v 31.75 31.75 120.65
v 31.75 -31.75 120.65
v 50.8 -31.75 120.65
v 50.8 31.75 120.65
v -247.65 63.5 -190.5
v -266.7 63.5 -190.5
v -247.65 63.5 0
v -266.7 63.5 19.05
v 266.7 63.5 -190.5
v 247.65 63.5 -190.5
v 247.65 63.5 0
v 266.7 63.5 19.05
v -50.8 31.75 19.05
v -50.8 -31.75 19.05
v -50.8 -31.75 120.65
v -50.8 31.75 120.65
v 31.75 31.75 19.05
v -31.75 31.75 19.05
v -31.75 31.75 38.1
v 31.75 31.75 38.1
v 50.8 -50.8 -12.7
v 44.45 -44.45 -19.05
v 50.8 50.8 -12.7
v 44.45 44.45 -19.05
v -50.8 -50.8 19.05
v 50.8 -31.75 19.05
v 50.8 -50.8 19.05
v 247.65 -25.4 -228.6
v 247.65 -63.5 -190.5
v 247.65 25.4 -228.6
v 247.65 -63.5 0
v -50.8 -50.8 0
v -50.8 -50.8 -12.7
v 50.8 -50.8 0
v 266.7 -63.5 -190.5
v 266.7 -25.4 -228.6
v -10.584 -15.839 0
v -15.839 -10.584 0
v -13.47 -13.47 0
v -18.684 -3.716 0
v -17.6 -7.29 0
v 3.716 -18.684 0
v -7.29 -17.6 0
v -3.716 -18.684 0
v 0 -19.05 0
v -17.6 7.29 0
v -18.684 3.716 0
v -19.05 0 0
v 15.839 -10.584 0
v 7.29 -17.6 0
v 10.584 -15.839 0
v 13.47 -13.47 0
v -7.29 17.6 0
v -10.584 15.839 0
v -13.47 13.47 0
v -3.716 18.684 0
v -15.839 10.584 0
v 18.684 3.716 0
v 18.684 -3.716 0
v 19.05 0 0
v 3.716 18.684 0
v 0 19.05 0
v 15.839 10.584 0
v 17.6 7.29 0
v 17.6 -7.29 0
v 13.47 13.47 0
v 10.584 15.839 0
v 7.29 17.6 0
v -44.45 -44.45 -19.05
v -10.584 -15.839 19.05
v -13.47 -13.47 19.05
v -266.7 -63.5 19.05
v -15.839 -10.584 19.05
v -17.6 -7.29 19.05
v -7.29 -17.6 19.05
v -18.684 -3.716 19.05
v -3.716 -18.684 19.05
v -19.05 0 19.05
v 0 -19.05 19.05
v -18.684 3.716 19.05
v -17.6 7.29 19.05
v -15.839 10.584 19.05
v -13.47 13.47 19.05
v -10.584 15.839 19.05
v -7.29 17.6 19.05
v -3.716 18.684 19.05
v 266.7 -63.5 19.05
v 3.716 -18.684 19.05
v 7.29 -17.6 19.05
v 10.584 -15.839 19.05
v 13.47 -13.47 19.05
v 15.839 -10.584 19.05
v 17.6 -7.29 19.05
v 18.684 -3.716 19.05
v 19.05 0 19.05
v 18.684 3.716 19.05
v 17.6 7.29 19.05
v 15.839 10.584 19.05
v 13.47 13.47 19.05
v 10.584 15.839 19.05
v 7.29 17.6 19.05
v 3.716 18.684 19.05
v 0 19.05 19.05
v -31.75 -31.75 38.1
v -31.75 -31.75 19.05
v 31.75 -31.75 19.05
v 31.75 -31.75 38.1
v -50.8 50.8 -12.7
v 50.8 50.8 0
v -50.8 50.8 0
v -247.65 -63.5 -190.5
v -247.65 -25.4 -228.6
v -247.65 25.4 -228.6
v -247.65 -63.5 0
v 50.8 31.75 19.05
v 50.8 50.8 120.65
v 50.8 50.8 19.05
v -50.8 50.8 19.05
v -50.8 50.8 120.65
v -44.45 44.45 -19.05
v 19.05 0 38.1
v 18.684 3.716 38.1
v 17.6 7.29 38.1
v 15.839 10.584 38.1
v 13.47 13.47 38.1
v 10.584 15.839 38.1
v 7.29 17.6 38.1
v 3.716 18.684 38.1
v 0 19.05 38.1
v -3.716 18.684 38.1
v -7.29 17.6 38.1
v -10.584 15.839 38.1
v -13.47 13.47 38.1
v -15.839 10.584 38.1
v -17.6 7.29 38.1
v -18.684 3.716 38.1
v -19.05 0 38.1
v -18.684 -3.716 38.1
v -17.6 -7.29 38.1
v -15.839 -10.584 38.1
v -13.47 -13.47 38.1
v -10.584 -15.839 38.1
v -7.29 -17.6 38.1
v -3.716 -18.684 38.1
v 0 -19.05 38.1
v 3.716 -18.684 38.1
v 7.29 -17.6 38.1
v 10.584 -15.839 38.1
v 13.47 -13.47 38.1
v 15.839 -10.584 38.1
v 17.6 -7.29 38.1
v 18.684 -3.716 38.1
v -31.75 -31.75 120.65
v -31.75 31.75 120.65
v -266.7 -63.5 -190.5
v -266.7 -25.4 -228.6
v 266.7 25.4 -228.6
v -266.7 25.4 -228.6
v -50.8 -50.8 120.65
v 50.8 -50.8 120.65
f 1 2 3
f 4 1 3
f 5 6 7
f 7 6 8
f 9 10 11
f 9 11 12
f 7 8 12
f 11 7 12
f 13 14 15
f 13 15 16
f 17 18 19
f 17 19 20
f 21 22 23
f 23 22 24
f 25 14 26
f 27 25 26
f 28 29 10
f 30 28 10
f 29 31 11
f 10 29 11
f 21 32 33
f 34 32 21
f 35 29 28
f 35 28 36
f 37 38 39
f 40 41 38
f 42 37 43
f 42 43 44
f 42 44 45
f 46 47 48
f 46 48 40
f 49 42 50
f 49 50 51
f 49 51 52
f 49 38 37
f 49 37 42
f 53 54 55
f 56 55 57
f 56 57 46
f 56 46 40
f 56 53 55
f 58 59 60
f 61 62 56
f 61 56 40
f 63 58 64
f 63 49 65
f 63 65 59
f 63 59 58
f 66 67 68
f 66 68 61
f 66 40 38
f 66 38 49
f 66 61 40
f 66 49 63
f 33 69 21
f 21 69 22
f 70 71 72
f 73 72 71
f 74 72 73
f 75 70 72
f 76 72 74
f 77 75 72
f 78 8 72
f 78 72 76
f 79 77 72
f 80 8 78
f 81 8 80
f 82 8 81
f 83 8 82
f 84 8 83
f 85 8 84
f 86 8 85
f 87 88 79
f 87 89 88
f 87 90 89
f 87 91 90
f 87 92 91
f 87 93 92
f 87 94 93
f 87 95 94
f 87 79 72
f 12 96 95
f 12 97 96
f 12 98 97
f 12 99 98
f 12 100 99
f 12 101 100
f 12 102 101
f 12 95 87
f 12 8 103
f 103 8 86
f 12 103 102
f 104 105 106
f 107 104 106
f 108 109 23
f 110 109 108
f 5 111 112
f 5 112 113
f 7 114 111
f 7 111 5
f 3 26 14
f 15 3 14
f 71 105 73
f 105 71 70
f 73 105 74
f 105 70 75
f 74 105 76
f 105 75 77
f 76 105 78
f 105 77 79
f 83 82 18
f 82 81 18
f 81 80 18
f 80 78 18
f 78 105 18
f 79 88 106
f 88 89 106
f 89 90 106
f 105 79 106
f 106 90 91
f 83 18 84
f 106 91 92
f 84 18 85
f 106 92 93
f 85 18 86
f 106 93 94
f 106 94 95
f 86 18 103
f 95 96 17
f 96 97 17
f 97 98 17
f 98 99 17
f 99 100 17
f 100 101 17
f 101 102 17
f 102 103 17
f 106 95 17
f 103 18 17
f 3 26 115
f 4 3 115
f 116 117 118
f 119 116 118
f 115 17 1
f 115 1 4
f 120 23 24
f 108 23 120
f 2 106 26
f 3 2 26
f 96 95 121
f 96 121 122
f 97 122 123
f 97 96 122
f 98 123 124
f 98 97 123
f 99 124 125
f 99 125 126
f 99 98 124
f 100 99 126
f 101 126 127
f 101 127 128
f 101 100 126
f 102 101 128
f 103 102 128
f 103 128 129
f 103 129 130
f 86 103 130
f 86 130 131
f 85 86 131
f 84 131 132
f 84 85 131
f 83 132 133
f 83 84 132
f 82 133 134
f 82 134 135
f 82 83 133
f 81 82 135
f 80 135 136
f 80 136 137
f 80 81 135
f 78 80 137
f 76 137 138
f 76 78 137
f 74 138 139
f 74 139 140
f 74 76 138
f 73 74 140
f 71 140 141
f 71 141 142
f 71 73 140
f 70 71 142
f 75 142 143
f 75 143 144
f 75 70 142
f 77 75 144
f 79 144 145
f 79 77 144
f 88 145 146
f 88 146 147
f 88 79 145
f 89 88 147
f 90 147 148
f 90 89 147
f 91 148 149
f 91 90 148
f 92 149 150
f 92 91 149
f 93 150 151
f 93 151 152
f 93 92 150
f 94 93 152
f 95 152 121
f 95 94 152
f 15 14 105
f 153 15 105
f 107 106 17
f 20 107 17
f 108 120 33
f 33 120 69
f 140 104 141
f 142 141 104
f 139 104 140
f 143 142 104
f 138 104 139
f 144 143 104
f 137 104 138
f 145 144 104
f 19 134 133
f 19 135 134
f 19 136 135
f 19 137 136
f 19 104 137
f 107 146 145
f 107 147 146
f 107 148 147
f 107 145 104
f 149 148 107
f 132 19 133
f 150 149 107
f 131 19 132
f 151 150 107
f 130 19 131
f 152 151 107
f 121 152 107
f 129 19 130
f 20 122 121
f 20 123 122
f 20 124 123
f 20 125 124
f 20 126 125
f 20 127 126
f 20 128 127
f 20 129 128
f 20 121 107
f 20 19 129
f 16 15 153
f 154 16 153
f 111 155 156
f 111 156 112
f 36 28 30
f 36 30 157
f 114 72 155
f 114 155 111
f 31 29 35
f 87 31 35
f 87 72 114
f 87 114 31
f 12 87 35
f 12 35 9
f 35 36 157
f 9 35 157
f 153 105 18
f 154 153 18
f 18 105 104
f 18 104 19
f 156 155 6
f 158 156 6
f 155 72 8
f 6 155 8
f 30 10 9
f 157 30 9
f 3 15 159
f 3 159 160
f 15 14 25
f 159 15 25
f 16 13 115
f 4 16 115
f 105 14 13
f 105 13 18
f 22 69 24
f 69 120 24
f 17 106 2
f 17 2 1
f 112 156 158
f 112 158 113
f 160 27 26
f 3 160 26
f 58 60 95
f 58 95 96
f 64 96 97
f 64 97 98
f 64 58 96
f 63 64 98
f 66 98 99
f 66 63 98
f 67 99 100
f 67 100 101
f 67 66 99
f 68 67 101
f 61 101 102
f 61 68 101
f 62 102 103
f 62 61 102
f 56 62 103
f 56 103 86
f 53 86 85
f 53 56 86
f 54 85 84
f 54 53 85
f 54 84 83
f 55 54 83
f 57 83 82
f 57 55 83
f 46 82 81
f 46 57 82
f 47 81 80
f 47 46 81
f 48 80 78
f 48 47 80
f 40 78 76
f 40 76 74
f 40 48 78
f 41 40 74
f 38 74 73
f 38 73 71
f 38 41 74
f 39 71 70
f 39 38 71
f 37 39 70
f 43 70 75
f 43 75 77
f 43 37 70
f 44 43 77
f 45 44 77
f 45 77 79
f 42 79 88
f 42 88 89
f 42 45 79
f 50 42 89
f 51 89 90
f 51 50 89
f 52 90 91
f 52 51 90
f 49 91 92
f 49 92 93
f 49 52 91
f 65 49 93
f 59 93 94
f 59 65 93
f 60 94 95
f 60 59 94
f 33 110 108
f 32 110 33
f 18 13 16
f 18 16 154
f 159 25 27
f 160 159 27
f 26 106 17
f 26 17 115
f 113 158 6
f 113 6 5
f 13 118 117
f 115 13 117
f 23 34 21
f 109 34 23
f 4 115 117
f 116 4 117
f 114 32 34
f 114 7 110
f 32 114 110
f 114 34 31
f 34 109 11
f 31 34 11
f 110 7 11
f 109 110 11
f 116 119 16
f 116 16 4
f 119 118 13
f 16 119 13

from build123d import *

# Parameters (mm, degrees)
F0_W      = 495.3
F0_H      = 127
F0_W_2    = 19.05
F1_DEPTH  = 19.05
F2_DEPTH  = 228.6
F3_SIZE   = 38.1
F4_W      = 63.5
F4_H      = 63.5
F4_R      = 19.05
F5_DEPTH  = 19.05
F6_DEPTH  = 101.6
F4_W_2    = 19.05
F7_DEPTH  = 101.6
F8_R      = 19.05
F9_DEPTH  = 19.05
F10_DEPTH = 19.05
F11_SIZE  = 6.35


with BuildPart() as f1:
    # F0 (on Top) → F1 (new body)
    with BuildSketch(Plane.XY):
        Rectangle(F0_W, F0_H)
        with Locations((-257.175, 0)):
            Rectangle(F0_W_2, F0_H)
        with Locations((257.175, 0)):
            Rectangle(F0_W_2, F0_H)
    extrude(amount=F1_DEPTH)

    # F0 (on Top) → F2 (join)
    with BuildSketch(Plane.XY):
        with Locations((-257.175, 0)):
            Rectangle(F0_W_2, F0_H)
        with Locations((257.175, 0)):
            Rectangle(F0_W_2, F0_H)
    extrude(amount=-F2_DEPTH)

    # F3
    f3_edges = [f1.edges().sort_by_distance(p)[0] for p in [
        (-257.175, -63.5, -228.6),
        (-257.175, 63.5, -228.6),
        (257.175, -63.5, -228.6),
        (257.175, 63.5, -228.6),
    ]]
    chamfer(f3_edges, length=F3_SIZE)

    # F8 (on face) → F9 (cut)
    with BuildSketch(Plane.XY):
        Circle(F8_R)
    extrude(amount=F9_DEPTH, mode=Mode.SUBTRACT)

    # F8 (on face) → F10 (join)
    with BuildSketch(Plane.XY):
        Polygon((-50.8, -31.75), (-50.8, -50.8), (50.8, -50.8), (50.8, -31.75), (50.8, 31.75), (50.8, 50.8), (-50.8, 50.8), (-50.8, 31.75), align=None)
        Circle(F8_R, mode=Mode.SUBTRACT)
        Circle(F8_R)
    extrude(amount=-F10_DEPTH)

    # F11
    f11_edges = [f1.edges().sort_by_distance(p)[0] for p in [
        (0, -50.8, -19.05),
        (50.8, 0, -19.05),
        (0, 50.8, -19.05),
        (-50.8, 0, -19.05),
    ]]
    chamfer(f11_edges, length=F11_SIZE)


with BuildPart() as f5:
    # F4 (on face) → F5 (new body)
    with BuildSketch(Plane.XY.offset(19.05)):
        Rectangle(F4_W, F4_H)
        Circle(F4_R, mode=Mode.SUBTRACT)
    extrude(amount=F5_DEPTH)


with BuildPart() as f6:
    # F4 (on face) → F6 (new body)
    with BuildSketch(Plane.XY.offset(19.05)):
        Polygon((-31.75, 31.75), (31.75, 31.75), (50.8, 31.75), (50.8, 50.8), (-50.8, 50.8), (-50.8, 31.75), align=None)
        Polygon((50.8, -31.75), (31.75, -31.75), (-31.75, -31.75), (-50.8, -31.75), (-50.8, -50.8), (50.8, -50.8), align=None)
    extrude(amount=F6_DEPTH)


with BuildPart() as f7:
    # F4 (on face) → F7 (new body)
    with BuildSketch(Plane.XY.offset(19.05)):
        with Locations((-41.275, 0)):
            Rectangle(F4_W_2, F4_H)
        with Locations((41.275, 0)):
            Rectangle(F4_W_2, F4_H)
    extrude(amount=F7_DEPTH)


solid = Compound([f1.part, f5.part, f6.part, f7.part])
